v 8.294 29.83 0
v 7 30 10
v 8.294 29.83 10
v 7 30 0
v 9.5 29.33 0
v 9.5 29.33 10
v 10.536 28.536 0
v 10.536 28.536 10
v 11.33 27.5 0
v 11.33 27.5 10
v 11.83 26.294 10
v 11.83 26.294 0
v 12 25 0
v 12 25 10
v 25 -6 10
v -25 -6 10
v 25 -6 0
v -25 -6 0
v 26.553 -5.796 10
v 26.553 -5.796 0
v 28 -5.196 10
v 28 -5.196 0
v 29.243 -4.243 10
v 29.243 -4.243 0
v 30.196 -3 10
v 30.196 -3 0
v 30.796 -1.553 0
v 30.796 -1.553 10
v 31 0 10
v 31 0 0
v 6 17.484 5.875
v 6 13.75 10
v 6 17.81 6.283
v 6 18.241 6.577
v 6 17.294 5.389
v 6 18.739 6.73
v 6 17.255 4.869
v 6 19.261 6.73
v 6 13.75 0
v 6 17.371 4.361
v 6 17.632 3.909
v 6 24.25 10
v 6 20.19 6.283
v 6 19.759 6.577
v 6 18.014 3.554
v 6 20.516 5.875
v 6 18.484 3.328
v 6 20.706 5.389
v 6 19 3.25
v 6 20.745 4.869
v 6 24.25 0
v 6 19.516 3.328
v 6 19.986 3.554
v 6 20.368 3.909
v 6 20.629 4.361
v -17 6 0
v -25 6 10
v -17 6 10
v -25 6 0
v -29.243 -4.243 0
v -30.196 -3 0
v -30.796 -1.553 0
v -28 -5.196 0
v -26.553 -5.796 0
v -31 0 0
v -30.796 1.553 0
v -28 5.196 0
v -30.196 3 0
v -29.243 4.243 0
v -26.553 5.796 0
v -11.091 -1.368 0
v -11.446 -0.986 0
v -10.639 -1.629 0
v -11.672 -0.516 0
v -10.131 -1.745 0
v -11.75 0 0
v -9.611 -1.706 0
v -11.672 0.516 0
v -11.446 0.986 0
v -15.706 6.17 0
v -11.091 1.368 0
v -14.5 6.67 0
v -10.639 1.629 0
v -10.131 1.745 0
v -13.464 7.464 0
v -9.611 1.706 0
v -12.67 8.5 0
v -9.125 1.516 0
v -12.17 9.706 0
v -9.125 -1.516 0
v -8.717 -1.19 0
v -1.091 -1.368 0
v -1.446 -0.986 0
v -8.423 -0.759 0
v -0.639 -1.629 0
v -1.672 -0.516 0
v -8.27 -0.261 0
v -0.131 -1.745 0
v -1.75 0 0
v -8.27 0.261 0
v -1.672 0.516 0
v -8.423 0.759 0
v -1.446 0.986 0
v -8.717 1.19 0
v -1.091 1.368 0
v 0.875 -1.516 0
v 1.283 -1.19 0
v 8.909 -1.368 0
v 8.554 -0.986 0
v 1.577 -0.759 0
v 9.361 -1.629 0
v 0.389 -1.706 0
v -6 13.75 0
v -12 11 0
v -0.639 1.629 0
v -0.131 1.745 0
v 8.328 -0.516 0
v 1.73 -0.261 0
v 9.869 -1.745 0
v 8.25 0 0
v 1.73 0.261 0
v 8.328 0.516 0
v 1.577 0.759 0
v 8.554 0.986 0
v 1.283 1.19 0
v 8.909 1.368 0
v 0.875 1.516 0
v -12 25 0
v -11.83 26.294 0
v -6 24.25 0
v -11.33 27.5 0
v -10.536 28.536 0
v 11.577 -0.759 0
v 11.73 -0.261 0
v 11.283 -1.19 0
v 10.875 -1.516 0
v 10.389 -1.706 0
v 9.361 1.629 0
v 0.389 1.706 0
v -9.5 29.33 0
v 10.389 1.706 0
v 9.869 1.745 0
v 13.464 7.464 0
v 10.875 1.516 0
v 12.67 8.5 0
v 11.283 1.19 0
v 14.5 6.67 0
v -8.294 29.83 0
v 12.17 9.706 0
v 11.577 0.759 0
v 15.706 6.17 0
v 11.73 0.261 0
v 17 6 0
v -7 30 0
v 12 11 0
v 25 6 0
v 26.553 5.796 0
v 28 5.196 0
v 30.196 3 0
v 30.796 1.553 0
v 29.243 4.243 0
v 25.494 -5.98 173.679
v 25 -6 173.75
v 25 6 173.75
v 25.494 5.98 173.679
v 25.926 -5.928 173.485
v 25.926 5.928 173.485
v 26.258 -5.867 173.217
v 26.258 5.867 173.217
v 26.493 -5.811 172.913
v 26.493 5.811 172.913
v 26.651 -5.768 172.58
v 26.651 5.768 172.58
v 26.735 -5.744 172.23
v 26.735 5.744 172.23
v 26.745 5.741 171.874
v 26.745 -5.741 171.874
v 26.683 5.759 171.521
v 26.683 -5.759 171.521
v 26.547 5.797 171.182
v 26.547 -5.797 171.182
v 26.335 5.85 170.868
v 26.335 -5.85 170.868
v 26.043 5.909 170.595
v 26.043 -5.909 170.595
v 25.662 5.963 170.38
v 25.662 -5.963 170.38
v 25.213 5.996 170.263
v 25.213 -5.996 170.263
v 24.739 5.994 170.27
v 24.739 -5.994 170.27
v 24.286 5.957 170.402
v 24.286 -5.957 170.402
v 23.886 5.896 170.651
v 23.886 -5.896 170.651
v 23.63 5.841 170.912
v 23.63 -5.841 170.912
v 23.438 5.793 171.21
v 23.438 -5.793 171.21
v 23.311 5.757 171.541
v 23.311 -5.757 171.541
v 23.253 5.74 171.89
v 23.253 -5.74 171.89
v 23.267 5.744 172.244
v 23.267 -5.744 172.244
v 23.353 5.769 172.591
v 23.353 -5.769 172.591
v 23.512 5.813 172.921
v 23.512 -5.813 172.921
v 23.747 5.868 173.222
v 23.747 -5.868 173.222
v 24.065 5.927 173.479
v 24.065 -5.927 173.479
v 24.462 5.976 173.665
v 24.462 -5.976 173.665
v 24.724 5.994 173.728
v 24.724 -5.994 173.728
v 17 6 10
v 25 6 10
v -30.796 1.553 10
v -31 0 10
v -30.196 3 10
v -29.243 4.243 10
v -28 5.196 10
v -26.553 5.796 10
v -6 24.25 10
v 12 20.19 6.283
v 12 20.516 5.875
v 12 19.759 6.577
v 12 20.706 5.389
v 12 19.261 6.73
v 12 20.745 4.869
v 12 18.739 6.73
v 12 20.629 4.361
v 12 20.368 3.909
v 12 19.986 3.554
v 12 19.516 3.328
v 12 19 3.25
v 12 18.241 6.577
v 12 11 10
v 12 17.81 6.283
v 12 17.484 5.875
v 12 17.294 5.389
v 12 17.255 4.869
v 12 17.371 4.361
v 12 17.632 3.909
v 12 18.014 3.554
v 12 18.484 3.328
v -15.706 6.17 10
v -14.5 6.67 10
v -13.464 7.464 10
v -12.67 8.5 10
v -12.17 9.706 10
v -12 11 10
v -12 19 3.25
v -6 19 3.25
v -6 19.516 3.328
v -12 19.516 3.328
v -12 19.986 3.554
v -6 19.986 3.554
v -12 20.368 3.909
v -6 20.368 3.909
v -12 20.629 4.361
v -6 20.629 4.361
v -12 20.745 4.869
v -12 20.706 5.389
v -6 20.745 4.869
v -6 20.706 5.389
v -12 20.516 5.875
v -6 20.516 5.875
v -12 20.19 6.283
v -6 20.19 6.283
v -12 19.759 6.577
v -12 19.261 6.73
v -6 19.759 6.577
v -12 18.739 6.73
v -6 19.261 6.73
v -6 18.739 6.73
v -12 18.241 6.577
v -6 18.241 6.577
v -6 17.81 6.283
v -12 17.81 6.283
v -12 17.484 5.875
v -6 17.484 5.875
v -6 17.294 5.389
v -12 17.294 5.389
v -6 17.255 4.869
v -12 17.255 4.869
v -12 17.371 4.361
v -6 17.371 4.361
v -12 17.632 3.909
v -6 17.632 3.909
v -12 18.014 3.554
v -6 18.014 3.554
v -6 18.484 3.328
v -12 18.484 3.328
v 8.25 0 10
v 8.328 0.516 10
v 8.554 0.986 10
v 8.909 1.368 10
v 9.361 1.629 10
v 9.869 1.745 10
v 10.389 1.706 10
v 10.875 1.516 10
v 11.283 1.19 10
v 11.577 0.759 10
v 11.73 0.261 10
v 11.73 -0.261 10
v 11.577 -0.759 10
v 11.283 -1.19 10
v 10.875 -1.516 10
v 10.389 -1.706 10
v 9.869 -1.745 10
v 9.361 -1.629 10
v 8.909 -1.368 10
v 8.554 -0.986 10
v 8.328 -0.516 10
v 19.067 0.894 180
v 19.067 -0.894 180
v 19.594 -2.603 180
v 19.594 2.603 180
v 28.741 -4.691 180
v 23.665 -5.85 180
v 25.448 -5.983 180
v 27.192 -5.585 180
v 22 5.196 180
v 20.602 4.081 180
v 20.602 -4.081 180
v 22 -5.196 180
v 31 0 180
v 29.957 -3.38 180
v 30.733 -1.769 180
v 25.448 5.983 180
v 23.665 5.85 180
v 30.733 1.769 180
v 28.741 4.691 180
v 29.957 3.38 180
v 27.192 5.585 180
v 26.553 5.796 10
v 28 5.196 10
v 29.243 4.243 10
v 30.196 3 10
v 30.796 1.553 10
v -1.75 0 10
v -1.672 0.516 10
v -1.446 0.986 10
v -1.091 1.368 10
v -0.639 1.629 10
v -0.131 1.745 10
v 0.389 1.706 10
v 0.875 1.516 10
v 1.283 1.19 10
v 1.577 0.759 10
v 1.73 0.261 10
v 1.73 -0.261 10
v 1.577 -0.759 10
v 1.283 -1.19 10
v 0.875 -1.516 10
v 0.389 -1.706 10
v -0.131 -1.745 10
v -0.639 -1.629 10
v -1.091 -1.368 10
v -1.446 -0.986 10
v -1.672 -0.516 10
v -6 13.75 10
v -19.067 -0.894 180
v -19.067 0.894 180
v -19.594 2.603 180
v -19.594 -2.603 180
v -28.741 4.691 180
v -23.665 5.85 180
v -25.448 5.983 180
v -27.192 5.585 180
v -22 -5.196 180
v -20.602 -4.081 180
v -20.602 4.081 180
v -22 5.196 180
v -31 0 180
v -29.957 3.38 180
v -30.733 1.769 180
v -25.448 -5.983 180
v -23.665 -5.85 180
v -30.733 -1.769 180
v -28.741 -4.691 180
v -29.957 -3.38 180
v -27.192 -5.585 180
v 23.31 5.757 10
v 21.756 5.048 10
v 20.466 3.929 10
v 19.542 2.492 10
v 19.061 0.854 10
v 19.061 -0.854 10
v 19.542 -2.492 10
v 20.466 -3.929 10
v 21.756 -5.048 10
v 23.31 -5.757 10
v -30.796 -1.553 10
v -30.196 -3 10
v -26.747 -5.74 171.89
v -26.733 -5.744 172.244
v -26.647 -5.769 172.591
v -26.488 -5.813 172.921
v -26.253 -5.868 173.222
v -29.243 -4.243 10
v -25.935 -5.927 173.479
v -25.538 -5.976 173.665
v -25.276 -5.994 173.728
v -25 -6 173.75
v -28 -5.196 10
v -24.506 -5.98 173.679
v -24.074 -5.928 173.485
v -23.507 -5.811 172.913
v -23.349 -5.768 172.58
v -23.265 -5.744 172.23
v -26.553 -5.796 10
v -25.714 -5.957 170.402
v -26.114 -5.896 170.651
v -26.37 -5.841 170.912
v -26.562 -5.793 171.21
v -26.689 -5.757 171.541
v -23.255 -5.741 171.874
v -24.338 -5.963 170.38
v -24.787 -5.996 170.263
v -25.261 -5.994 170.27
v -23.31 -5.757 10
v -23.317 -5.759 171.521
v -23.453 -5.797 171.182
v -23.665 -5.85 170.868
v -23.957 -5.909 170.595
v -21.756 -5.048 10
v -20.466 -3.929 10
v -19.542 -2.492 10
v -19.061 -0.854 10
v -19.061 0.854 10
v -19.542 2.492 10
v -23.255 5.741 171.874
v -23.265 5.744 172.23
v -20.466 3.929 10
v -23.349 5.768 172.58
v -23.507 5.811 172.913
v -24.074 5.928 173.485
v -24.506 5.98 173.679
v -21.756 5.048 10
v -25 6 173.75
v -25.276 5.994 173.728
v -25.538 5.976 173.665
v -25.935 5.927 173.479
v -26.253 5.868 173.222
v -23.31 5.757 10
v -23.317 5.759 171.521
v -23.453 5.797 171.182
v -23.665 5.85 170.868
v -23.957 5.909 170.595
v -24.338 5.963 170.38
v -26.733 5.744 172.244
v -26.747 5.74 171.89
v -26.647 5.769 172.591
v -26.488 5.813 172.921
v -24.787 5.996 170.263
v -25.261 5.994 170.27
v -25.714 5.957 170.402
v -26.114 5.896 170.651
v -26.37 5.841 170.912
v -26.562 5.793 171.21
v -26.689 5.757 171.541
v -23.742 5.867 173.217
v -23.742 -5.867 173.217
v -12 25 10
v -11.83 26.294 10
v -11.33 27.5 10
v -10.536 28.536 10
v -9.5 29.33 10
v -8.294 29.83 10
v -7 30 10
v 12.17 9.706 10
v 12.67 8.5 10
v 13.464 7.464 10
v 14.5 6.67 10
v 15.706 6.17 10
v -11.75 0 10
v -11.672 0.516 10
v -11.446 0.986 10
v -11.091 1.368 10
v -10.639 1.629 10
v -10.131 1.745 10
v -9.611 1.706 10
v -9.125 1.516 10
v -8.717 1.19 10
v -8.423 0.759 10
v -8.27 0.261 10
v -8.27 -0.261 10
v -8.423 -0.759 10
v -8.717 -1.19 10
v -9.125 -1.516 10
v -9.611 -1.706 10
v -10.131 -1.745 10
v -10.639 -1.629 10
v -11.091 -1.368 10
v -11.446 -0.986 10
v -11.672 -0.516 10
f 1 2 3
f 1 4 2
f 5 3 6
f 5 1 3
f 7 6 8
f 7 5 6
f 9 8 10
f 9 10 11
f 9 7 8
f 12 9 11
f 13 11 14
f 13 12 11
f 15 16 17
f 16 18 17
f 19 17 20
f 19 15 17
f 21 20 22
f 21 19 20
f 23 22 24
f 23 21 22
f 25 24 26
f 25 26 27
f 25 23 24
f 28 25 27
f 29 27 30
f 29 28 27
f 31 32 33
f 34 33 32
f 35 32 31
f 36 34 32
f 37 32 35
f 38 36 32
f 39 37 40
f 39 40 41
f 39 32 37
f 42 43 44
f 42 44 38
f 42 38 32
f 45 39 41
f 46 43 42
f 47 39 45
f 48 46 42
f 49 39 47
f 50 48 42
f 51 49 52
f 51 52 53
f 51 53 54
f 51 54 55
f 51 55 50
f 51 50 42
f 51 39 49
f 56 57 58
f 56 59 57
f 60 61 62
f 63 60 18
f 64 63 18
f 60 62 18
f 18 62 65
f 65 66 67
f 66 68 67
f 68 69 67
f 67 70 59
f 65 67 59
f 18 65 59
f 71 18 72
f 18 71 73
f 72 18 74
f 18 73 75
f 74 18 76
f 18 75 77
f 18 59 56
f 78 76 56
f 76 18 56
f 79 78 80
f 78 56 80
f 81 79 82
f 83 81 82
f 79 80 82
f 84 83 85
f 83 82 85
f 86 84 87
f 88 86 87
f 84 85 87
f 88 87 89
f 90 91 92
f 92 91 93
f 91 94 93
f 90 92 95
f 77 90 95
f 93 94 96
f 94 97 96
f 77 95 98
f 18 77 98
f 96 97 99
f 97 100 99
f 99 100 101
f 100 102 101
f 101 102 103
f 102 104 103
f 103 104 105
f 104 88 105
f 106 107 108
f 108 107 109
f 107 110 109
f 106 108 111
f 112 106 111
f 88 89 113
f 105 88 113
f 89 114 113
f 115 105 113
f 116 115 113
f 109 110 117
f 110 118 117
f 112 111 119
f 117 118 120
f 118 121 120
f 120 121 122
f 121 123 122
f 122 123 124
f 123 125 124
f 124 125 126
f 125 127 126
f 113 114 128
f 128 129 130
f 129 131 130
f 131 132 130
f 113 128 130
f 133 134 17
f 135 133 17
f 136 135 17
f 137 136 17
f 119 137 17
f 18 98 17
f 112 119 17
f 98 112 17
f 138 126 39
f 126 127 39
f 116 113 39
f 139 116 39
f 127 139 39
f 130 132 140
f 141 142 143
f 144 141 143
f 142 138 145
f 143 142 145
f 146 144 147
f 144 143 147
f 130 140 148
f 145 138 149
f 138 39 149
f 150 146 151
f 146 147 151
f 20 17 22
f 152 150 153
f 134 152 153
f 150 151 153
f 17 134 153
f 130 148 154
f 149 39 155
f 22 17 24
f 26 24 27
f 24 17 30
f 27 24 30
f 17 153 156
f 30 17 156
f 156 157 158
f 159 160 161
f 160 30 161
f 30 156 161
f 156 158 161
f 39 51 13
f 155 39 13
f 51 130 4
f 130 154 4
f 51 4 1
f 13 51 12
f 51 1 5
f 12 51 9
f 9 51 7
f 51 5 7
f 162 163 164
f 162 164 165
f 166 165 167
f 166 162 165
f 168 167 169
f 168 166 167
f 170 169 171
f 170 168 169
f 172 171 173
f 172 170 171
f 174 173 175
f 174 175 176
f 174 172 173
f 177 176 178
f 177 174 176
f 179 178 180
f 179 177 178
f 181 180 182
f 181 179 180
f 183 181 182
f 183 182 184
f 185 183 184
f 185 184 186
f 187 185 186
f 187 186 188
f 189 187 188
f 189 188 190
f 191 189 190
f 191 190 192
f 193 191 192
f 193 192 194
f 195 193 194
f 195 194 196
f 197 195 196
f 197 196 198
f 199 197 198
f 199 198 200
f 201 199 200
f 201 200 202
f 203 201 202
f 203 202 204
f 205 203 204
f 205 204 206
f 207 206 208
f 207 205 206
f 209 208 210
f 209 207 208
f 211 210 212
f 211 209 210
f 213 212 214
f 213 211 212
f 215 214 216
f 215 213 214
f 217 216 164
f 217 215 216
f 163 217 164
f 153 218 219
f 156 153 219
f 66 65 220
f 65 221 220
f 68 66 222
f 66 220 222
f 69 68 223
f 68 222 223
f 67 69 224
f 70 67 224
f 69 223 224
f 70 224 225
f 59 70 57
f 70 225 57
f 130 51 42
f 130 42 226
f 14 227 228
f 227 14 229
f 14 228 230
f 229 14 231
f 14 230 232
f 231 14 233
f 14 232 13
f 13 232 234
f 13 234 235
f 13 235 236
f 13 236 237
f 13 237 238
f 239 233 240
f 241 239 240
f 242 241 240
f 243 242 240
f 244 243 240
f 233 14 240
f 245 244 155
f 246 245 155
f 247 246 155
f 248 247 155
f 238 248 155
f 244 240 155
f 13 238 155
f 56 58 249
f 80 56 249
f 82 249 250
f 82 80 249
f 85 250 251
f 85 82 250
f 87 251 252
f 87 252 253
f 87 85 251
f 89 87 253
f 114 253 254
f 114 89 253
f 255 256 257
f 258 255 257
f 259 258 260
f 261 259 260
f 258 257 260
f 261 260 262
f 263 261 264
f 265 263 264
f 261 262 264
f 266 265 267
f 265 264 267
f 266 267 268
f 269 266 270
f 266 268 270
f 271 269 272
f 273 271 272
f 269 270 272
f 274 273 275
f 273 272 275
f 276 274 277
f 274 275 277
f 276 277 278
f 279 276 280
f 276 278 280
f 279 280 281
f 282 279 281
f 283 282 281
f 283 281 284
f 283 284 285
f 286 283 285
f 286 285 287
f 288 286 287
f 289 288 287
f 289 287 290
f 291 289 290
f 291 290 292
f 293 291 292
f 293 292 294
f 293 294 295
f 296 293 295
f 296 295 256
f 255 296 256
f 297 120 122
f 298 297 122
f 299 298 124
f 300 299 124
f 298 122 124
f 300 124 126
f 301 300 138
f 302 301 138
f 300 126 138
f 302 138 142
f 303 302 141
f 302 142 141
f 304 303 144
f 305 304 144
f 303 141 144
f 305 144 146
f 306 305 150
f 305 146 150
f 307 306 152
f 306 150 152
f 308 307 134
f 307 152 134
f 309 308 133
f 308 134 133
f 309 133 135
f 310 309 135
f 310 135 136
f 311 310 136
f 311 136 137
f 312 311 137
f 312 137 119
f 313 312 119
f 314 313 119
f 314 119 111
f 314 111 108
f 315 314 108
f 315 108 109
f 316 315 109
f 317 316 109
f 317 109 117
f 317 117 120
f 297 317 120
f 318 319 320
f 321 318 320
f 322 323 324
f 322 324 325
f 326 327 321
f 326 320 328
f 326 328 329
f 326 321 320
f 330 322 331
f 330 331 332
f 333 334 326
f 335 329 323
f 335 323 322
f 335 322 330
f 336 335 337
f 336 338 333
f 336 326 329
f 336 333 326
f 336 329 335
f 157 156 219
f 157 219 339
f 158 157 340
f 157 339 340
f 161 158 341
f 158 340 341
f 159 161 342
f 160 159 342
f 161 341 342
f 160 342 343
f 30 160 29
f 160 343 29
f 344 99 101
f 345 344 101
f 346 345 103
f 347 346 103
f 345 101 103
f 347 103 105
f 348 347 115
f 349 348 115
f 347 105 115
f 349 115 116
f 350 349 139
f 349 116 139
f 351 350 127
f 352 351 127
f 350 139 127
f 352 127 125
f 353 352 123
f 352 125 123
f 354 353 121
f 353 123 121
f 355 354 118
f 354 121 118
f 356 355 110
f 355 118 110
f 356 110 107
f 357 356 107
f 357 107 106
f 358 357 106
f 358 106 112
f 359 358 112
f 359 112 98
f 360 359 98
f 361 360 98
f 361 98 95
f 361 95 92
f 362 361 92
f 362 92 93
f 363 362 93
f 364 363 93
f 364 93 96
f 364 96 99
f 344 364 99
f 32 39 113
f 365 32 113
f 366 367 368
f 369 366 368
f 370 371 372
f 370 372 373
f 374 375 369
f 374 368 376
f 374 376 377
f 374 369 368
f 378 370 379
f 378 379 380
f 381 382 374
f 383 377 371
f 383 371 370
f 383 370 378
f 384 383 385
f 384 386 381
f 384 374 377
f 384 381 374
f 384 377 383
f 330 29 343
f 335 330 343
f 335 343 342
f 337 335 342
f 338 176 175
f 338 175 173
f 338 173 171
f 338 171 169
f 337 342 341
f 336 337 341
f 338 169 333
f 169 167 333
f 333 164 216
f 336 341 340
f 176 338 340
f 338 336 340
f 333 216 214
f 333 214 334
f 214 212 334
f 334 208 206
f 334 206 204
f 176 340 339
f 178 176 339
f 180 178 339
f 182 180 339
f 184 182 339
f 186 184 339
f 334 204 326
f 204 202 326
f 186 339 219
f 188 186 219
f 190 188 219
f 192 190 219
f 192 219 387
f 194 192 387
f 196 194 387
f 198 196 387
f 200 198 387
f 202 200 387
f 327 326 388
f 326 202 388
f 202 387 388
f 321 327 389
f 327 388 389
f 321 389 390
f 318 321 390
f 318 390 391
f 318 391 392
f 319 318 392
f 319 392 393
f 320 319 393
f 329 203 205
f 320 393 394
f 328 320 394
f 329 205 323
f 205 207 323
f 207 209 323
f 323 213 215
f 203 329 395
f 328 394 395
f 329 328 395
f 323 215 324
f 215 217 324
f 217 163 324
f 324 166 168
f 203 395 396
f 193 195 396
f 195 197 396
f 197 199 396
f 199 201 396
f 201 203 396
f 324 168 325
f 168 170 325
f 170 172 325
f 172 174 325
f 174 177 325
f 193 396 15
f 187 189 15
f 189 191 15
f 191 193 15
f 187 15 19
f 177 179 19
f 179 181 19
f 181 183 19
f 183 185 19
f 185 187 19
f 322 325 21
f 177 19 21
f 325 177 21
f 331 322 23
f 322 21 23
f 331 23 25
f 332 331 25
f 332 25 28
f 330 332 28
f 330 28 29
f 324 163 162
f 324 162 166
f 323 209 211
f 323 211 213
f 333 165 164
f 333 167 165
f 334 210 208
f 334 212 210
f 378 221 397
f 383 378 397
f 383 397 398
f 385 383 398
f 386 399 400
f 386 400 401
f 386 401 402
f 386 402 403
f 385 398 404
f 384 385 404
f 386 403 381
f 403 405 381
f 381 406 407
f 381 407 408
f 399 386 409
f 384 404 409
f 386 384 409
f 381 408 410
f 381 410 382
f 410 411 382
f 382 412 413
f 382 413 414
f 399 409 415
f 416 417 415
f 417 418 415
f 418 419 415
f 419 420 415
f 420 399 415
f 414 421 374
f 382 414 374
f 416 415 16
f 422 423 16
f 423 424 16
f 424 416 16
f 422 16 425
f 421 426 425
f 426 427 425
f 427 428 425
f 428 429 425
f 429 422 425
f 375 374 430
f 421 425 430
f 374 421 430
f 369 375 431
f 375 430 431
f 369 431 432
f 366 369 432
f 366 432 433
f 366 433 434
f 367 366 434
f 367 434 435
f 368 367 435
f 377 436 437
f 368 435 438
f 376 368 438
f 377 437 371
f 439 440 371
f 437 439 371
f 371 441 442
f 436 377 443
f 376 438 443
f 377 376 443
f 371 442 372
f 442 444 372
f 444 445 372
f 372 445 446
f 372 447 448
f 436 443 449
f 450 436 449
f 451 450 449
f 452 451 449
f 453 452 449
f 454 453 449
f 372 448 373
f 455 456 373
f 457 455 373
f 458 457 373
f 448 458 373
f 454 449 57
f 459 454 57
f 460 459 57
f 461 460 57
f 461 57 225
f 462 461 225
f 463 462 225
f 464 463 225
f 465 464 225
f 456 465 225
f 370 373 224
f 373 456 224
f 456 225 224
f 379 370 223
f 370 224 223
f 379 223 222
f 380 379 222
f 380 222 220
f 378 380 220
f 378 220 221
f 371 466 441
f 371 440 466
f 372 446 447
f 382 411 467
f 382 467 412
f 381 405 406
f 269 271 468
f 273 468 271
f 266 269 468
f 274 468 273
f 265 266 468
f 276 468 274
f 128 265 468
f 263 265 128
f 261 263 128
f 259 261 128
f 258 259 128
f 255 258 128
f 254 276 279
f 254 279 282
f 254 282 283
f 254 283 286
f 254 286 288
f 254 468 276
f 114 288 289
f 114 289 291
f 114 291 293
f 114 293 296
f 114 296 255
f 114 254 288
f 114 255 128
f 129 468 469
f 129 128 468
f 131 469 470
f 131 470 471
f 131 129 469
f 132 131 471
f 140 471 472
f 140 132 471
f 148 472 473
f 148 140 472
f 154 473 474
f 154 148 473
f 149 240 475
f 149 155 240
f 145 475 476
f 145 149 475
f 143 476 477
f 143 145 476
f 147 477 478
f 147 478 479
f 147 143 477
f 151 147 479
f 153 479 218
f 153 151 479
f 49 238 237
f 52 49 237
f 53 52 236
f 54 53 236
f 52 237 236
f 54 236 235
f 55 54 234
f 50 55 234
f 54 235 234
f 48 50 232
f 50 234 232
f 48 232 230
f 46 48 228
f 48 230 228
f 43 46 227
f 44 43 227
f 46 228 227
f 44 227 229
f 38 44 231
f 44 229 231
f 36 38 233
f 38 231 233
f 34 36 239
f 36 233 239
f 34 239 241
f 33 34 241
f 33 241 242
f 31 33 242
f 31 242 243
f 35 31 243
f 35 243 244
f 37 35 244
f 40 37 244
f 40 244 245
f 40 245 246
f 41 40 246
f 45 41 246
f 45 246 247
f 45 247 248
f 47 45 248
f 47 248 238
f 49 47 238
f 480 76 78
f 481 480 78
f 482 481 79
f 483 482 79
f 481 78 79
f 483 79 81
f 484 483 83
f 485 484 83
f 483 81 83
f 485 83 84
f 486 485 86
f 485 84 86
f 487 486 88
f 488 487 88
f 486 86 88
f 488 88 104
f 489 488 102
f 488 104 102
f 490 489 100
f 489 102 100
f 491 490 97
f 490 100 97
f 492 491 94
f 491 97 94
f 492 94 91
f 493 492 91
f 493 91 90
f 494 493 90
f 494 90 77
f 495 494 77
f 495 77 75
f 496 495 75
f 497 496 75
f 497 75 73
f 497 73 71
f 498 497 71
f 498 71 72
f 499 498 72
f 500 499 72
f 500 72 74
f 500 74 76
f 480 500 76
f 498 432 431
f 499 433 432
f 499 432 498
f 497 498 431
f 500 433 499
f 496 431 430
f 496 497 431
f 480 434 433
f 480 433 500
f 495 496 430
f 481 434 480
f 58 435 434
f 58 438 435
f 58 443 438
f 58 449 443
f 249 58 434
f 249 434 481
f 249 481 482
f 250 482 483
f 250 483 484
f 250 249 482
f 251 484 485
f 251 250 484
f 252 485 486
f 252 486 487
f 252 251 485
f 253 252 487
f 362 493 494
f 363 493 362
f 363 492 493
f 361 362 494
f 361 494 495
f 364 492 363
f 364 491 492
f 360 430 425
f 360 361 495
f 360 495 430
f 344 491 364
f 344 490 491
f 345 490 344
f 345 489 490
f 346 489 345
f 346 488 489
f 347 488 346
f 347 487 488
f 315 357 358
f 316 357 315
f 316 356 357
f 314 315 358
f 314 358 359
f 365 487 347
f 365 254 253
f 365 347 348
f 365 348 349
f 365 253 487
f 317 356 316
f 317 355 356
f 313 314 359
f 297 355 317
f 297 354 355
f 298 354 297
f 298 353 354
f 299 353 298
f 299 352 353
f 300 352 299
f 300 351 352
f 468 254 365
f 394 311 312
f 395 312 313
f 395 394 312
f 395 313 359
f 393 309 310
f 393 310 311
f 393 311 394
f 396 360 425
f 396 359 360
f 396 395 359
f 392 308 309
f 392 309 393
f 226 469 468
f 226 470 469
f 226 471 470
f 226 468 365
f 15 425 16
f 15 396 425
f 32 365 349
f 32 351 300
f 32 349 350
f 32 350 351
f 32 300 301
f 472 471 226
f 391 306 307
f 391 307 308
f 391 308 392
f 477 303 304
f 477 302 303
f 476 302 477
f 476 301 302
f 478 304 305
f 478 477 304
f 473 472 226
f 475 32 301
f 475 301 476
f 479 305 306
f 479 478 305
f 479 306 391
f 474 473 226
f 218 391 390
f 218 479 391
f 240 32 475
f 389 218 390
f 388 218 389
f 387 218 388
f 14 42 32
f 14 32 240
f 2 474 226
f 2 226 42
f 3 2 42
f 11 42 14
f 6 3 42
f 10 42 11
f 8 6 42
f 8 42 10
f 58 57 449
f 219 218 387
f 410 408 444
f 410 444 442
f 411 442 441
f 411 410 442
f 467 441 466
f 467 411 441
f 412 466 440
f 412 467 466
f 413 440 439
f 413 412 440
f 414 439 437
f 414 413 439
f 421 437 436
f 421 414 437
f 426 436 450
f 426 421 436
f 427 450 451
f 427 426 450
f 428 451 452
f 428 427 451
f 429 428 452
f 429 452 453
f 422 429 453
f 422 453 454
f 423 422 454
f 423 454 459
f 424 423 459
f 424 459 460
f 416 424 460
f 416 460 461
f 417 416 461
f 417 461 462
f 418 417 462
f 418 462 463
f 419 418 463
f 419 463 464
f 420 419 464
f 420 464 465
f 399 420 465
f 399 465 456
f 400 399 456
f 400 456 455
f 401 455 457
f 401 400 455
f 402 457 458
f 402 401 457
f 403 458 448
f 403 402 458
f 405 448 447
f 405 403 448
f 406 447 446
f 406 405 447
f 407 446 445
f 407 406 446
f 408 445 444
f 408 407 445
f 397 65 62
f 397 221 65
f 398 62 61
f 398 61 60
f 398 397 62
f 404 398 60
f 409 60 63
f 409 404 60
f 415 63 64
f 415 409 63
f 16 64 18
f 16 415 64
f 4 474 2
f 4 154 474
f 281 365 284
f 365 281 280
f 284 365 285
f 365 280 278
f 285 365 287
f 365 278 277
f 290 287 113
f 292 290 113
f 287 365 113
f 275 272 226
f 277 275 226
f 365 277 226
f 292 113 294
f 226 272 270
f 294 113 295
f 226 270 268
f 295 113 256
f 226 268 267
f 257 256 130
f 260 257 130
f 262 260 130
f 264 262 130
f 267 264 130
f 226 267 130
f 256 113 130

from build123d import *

# Parameters (mm, degrees)
SKETCH1_W               = 62
SKETCH1_H               = 12
BOSS_EXTRUDE1_DEPTH     = 10
SKETCH2_R               = 6
BOSS_EXTRUDE2_DEPTH     = 170
SKETCH3_W               = 24
SKETCH3_H               = 10
BOSS_EXTRUDE3_DEPTH     = 24
CUT_EXTRUDE1_REACH      = 187.097
SKETCH4_W               = 12
SKETCH4_H               = 10.5
SKETCH5_R               = 1.75
CUT_EXTRUDE2_DEPTH      = 188.48066567
FILLET1_R               = 6
FILLET2_R               = 5
CUT_EXTRUDE3_DEPTH      = 186.097271725
CUT_EXTRUDE3_DEPTH_BACK = 186.097271725
SKETCH6_R               = 1.75
CUT_EXTRUDE4_REACH      = 187.097
SKETCH7_R               = 1.75
CUT_EXTRUDE5_REACH      = 187.097
SKETCH8_R               = 1.75


with BuildPart() as part:
    # Sketch1 → Boss-Extrude1 (new body)
    with BuildSketch(Plane.XY):
        Rectangle(SKETCH1_W, SKETCH1_H)
    extrude(amount=BOSS_EXTRUDE1_DEPTH)

    # Sketch2 → Boss-Extrude2 (add)
    with BuildSketch(Plane.XY.offset(10)):
        with Locations(Location((-25, 0, 0), (0, 0, 180))):
            Circle(SKETCH2_R)
        with Locations((25, 0)):
            Circle(SKETCH2_R)
    extrude(amount=BOSS_EXTRUDE2_DEPTH)

    # Sketch3 → Boss-Extrude3 (add)
    with BuildSketch(Plane(origin=(0, 6, 0), x_dir=(1, 0, 0), z_dir=(0, 1, 0))):
        with Locations((0, -5)):
            Rectangle(SKETCH3_W, SKETCH3_H)
    extrude(amount=BOSS_EXTRUDE3_DEPTH)

    # Sketch4 → Cut-Extrude1 (cut, up to next)
    with BuildSketch(Plane(origin=(0, 0, 0), x_dir=(-1, 0, 0), z_dir=(0, 0, -1)), mode=Mode.PRIVATE) as cut_extrude1_sk1:
        with Locations((0, 19)):
            Rectangle(SKETCH4_W, SKETCH4_H)
    cut_extrude1_tool1 = extrude(cut_extrude1_sk1.sketch, amount=-CUT_EXTRUDE1_REACH, mode=Mode.PRIVATE) & part.part
    add(cut_extrude1_tool1.solids().sort_by_distance((0, 19, 0))[0], mode=Mode.SUBTRACT)

    # Sketch5 → Cut-Extrude2 (cut, through all)
    with BuildSketch(Plane(origin=(12, 0, 0), x_dir=(0, 0, -1), z_dir=(1, 0, 0))):
        with Locations((-5, 19)):
            Circle(SKETCH5_R)
    extrude(amount=-CUT_EXTRUDE2_DEPTH, mode=Mode.SUBTRACT)

    # Fillet1
    fillet1_edges = [part.edges().sort_by_distance(p)[0] for p in [
        (-31, -6, 5),
        (-31, 6, 5),
        (31, 6, 5),
        (31, -6, 5),
    ]]
    fillet(fillet1_edges, radius=FILLET1_R - 0.0001)  # a hair under: the kernel refuses the full size

    # Fillet2
    fillet2_edges = [part.edges().sort_by_distance(p)[0] for p in [
        (-12, 6, 5),
        (12, 6, 5),
        (-12, 30, 5),
        (12, 30, 5),
    ]]
    fillet(fillet2_edges, radius=FILLET2_R)

    # Sketch6 → Cut-Extrude3 (cut, two sides: drawn at the far end of the back side and taken through both)
    with BuildSketch(Plane(origin=(0, 0, 0), x_dir=(1, 0, 0), z_dir=(0, 1, 0)).offset(-CUT_EXTRUDE3_DEPTH_BACK)):
        with Locations(Location((-25, -172, 0), (0, 0, 270))):
            Circle(SKETCH6_R)
        with Locations(Location((25, -172, 0), (0, 0, 270))):
            Circle(SKETCH6_R)
    extrude(amount=CUT_EXTRUDE3_DEPTH + CUT_EXTRUDE3_DEPTH_BACK, mode=Mode.SUBTRACT)

    # Sketch7 → Cut-Extrude4 (cut, up to next)
    with BuildSketch(Plane(origin=(0, 0, 0), x_dir=(-1, 0, 0), z_dir=(0, 0, -1)), mode=Mode.PRIVATE) as cut_extrude4_sk1:
        with Locations((-10, 0)):
            Circle(SKETCH7_R)
    cut_extrude4_tool1 = extrude(cut_extrude4_sk1.sketch, amount=-CUT_EXTRUDE4_REACH, mode=Mode.PRIVATE) & part.part
    # Sketch7 → Cut-Extrude4 (cut, up to next)
    with BuildSketch(Plane(origin=(0, 0, 0), x_dir=(-1, 0, 0), z_dir=(0, 0, -1)), mode=Mode.PRIVATE) as cut_extrude4_sk2:
        with Locations((10, 0)):
            Circle(SKETCH7_R)
    cut_extrude4_tool2 = extrude(cut_extrude4_sk2.sketch, amount=-CUT_EXTRUDE4_REACH, mode=Mode.PRIVATE) & part.part
    add(cut_extrude4_tool1.solids().sort_by_distance((10, 0, 0))[0], mode=Mode.SUBTRACT)
    add(cut_extrude4_tool2.solids().sort_by_distance((-10, 0, 0))[0], mode=Mode.SUBTRACT)

    # Sketch8 → Cut-Extrude5 (cut, up to next)
    with BuildSketch(Plane(origin=(0, 0, 0), x_dir=(-1, 0, 0), z_dir=(0, 0, -1)), mode=Mode.PRIVATE) as cut_extrude5_sk1:
        Circle(SKETCH8_R)
    cut_extrude5_tool1 = extrude(cut_extrude5_sk1.sketch, amount=-CUT_EXTRUDE5_REACH, mode=Mode.PRIVATE) & part.part
    add(cut_extrude5_tool1.solids().sort_by_distance((0, 0, 0))[0], mode=Mode.SUBTRACT)


solid = part.part
